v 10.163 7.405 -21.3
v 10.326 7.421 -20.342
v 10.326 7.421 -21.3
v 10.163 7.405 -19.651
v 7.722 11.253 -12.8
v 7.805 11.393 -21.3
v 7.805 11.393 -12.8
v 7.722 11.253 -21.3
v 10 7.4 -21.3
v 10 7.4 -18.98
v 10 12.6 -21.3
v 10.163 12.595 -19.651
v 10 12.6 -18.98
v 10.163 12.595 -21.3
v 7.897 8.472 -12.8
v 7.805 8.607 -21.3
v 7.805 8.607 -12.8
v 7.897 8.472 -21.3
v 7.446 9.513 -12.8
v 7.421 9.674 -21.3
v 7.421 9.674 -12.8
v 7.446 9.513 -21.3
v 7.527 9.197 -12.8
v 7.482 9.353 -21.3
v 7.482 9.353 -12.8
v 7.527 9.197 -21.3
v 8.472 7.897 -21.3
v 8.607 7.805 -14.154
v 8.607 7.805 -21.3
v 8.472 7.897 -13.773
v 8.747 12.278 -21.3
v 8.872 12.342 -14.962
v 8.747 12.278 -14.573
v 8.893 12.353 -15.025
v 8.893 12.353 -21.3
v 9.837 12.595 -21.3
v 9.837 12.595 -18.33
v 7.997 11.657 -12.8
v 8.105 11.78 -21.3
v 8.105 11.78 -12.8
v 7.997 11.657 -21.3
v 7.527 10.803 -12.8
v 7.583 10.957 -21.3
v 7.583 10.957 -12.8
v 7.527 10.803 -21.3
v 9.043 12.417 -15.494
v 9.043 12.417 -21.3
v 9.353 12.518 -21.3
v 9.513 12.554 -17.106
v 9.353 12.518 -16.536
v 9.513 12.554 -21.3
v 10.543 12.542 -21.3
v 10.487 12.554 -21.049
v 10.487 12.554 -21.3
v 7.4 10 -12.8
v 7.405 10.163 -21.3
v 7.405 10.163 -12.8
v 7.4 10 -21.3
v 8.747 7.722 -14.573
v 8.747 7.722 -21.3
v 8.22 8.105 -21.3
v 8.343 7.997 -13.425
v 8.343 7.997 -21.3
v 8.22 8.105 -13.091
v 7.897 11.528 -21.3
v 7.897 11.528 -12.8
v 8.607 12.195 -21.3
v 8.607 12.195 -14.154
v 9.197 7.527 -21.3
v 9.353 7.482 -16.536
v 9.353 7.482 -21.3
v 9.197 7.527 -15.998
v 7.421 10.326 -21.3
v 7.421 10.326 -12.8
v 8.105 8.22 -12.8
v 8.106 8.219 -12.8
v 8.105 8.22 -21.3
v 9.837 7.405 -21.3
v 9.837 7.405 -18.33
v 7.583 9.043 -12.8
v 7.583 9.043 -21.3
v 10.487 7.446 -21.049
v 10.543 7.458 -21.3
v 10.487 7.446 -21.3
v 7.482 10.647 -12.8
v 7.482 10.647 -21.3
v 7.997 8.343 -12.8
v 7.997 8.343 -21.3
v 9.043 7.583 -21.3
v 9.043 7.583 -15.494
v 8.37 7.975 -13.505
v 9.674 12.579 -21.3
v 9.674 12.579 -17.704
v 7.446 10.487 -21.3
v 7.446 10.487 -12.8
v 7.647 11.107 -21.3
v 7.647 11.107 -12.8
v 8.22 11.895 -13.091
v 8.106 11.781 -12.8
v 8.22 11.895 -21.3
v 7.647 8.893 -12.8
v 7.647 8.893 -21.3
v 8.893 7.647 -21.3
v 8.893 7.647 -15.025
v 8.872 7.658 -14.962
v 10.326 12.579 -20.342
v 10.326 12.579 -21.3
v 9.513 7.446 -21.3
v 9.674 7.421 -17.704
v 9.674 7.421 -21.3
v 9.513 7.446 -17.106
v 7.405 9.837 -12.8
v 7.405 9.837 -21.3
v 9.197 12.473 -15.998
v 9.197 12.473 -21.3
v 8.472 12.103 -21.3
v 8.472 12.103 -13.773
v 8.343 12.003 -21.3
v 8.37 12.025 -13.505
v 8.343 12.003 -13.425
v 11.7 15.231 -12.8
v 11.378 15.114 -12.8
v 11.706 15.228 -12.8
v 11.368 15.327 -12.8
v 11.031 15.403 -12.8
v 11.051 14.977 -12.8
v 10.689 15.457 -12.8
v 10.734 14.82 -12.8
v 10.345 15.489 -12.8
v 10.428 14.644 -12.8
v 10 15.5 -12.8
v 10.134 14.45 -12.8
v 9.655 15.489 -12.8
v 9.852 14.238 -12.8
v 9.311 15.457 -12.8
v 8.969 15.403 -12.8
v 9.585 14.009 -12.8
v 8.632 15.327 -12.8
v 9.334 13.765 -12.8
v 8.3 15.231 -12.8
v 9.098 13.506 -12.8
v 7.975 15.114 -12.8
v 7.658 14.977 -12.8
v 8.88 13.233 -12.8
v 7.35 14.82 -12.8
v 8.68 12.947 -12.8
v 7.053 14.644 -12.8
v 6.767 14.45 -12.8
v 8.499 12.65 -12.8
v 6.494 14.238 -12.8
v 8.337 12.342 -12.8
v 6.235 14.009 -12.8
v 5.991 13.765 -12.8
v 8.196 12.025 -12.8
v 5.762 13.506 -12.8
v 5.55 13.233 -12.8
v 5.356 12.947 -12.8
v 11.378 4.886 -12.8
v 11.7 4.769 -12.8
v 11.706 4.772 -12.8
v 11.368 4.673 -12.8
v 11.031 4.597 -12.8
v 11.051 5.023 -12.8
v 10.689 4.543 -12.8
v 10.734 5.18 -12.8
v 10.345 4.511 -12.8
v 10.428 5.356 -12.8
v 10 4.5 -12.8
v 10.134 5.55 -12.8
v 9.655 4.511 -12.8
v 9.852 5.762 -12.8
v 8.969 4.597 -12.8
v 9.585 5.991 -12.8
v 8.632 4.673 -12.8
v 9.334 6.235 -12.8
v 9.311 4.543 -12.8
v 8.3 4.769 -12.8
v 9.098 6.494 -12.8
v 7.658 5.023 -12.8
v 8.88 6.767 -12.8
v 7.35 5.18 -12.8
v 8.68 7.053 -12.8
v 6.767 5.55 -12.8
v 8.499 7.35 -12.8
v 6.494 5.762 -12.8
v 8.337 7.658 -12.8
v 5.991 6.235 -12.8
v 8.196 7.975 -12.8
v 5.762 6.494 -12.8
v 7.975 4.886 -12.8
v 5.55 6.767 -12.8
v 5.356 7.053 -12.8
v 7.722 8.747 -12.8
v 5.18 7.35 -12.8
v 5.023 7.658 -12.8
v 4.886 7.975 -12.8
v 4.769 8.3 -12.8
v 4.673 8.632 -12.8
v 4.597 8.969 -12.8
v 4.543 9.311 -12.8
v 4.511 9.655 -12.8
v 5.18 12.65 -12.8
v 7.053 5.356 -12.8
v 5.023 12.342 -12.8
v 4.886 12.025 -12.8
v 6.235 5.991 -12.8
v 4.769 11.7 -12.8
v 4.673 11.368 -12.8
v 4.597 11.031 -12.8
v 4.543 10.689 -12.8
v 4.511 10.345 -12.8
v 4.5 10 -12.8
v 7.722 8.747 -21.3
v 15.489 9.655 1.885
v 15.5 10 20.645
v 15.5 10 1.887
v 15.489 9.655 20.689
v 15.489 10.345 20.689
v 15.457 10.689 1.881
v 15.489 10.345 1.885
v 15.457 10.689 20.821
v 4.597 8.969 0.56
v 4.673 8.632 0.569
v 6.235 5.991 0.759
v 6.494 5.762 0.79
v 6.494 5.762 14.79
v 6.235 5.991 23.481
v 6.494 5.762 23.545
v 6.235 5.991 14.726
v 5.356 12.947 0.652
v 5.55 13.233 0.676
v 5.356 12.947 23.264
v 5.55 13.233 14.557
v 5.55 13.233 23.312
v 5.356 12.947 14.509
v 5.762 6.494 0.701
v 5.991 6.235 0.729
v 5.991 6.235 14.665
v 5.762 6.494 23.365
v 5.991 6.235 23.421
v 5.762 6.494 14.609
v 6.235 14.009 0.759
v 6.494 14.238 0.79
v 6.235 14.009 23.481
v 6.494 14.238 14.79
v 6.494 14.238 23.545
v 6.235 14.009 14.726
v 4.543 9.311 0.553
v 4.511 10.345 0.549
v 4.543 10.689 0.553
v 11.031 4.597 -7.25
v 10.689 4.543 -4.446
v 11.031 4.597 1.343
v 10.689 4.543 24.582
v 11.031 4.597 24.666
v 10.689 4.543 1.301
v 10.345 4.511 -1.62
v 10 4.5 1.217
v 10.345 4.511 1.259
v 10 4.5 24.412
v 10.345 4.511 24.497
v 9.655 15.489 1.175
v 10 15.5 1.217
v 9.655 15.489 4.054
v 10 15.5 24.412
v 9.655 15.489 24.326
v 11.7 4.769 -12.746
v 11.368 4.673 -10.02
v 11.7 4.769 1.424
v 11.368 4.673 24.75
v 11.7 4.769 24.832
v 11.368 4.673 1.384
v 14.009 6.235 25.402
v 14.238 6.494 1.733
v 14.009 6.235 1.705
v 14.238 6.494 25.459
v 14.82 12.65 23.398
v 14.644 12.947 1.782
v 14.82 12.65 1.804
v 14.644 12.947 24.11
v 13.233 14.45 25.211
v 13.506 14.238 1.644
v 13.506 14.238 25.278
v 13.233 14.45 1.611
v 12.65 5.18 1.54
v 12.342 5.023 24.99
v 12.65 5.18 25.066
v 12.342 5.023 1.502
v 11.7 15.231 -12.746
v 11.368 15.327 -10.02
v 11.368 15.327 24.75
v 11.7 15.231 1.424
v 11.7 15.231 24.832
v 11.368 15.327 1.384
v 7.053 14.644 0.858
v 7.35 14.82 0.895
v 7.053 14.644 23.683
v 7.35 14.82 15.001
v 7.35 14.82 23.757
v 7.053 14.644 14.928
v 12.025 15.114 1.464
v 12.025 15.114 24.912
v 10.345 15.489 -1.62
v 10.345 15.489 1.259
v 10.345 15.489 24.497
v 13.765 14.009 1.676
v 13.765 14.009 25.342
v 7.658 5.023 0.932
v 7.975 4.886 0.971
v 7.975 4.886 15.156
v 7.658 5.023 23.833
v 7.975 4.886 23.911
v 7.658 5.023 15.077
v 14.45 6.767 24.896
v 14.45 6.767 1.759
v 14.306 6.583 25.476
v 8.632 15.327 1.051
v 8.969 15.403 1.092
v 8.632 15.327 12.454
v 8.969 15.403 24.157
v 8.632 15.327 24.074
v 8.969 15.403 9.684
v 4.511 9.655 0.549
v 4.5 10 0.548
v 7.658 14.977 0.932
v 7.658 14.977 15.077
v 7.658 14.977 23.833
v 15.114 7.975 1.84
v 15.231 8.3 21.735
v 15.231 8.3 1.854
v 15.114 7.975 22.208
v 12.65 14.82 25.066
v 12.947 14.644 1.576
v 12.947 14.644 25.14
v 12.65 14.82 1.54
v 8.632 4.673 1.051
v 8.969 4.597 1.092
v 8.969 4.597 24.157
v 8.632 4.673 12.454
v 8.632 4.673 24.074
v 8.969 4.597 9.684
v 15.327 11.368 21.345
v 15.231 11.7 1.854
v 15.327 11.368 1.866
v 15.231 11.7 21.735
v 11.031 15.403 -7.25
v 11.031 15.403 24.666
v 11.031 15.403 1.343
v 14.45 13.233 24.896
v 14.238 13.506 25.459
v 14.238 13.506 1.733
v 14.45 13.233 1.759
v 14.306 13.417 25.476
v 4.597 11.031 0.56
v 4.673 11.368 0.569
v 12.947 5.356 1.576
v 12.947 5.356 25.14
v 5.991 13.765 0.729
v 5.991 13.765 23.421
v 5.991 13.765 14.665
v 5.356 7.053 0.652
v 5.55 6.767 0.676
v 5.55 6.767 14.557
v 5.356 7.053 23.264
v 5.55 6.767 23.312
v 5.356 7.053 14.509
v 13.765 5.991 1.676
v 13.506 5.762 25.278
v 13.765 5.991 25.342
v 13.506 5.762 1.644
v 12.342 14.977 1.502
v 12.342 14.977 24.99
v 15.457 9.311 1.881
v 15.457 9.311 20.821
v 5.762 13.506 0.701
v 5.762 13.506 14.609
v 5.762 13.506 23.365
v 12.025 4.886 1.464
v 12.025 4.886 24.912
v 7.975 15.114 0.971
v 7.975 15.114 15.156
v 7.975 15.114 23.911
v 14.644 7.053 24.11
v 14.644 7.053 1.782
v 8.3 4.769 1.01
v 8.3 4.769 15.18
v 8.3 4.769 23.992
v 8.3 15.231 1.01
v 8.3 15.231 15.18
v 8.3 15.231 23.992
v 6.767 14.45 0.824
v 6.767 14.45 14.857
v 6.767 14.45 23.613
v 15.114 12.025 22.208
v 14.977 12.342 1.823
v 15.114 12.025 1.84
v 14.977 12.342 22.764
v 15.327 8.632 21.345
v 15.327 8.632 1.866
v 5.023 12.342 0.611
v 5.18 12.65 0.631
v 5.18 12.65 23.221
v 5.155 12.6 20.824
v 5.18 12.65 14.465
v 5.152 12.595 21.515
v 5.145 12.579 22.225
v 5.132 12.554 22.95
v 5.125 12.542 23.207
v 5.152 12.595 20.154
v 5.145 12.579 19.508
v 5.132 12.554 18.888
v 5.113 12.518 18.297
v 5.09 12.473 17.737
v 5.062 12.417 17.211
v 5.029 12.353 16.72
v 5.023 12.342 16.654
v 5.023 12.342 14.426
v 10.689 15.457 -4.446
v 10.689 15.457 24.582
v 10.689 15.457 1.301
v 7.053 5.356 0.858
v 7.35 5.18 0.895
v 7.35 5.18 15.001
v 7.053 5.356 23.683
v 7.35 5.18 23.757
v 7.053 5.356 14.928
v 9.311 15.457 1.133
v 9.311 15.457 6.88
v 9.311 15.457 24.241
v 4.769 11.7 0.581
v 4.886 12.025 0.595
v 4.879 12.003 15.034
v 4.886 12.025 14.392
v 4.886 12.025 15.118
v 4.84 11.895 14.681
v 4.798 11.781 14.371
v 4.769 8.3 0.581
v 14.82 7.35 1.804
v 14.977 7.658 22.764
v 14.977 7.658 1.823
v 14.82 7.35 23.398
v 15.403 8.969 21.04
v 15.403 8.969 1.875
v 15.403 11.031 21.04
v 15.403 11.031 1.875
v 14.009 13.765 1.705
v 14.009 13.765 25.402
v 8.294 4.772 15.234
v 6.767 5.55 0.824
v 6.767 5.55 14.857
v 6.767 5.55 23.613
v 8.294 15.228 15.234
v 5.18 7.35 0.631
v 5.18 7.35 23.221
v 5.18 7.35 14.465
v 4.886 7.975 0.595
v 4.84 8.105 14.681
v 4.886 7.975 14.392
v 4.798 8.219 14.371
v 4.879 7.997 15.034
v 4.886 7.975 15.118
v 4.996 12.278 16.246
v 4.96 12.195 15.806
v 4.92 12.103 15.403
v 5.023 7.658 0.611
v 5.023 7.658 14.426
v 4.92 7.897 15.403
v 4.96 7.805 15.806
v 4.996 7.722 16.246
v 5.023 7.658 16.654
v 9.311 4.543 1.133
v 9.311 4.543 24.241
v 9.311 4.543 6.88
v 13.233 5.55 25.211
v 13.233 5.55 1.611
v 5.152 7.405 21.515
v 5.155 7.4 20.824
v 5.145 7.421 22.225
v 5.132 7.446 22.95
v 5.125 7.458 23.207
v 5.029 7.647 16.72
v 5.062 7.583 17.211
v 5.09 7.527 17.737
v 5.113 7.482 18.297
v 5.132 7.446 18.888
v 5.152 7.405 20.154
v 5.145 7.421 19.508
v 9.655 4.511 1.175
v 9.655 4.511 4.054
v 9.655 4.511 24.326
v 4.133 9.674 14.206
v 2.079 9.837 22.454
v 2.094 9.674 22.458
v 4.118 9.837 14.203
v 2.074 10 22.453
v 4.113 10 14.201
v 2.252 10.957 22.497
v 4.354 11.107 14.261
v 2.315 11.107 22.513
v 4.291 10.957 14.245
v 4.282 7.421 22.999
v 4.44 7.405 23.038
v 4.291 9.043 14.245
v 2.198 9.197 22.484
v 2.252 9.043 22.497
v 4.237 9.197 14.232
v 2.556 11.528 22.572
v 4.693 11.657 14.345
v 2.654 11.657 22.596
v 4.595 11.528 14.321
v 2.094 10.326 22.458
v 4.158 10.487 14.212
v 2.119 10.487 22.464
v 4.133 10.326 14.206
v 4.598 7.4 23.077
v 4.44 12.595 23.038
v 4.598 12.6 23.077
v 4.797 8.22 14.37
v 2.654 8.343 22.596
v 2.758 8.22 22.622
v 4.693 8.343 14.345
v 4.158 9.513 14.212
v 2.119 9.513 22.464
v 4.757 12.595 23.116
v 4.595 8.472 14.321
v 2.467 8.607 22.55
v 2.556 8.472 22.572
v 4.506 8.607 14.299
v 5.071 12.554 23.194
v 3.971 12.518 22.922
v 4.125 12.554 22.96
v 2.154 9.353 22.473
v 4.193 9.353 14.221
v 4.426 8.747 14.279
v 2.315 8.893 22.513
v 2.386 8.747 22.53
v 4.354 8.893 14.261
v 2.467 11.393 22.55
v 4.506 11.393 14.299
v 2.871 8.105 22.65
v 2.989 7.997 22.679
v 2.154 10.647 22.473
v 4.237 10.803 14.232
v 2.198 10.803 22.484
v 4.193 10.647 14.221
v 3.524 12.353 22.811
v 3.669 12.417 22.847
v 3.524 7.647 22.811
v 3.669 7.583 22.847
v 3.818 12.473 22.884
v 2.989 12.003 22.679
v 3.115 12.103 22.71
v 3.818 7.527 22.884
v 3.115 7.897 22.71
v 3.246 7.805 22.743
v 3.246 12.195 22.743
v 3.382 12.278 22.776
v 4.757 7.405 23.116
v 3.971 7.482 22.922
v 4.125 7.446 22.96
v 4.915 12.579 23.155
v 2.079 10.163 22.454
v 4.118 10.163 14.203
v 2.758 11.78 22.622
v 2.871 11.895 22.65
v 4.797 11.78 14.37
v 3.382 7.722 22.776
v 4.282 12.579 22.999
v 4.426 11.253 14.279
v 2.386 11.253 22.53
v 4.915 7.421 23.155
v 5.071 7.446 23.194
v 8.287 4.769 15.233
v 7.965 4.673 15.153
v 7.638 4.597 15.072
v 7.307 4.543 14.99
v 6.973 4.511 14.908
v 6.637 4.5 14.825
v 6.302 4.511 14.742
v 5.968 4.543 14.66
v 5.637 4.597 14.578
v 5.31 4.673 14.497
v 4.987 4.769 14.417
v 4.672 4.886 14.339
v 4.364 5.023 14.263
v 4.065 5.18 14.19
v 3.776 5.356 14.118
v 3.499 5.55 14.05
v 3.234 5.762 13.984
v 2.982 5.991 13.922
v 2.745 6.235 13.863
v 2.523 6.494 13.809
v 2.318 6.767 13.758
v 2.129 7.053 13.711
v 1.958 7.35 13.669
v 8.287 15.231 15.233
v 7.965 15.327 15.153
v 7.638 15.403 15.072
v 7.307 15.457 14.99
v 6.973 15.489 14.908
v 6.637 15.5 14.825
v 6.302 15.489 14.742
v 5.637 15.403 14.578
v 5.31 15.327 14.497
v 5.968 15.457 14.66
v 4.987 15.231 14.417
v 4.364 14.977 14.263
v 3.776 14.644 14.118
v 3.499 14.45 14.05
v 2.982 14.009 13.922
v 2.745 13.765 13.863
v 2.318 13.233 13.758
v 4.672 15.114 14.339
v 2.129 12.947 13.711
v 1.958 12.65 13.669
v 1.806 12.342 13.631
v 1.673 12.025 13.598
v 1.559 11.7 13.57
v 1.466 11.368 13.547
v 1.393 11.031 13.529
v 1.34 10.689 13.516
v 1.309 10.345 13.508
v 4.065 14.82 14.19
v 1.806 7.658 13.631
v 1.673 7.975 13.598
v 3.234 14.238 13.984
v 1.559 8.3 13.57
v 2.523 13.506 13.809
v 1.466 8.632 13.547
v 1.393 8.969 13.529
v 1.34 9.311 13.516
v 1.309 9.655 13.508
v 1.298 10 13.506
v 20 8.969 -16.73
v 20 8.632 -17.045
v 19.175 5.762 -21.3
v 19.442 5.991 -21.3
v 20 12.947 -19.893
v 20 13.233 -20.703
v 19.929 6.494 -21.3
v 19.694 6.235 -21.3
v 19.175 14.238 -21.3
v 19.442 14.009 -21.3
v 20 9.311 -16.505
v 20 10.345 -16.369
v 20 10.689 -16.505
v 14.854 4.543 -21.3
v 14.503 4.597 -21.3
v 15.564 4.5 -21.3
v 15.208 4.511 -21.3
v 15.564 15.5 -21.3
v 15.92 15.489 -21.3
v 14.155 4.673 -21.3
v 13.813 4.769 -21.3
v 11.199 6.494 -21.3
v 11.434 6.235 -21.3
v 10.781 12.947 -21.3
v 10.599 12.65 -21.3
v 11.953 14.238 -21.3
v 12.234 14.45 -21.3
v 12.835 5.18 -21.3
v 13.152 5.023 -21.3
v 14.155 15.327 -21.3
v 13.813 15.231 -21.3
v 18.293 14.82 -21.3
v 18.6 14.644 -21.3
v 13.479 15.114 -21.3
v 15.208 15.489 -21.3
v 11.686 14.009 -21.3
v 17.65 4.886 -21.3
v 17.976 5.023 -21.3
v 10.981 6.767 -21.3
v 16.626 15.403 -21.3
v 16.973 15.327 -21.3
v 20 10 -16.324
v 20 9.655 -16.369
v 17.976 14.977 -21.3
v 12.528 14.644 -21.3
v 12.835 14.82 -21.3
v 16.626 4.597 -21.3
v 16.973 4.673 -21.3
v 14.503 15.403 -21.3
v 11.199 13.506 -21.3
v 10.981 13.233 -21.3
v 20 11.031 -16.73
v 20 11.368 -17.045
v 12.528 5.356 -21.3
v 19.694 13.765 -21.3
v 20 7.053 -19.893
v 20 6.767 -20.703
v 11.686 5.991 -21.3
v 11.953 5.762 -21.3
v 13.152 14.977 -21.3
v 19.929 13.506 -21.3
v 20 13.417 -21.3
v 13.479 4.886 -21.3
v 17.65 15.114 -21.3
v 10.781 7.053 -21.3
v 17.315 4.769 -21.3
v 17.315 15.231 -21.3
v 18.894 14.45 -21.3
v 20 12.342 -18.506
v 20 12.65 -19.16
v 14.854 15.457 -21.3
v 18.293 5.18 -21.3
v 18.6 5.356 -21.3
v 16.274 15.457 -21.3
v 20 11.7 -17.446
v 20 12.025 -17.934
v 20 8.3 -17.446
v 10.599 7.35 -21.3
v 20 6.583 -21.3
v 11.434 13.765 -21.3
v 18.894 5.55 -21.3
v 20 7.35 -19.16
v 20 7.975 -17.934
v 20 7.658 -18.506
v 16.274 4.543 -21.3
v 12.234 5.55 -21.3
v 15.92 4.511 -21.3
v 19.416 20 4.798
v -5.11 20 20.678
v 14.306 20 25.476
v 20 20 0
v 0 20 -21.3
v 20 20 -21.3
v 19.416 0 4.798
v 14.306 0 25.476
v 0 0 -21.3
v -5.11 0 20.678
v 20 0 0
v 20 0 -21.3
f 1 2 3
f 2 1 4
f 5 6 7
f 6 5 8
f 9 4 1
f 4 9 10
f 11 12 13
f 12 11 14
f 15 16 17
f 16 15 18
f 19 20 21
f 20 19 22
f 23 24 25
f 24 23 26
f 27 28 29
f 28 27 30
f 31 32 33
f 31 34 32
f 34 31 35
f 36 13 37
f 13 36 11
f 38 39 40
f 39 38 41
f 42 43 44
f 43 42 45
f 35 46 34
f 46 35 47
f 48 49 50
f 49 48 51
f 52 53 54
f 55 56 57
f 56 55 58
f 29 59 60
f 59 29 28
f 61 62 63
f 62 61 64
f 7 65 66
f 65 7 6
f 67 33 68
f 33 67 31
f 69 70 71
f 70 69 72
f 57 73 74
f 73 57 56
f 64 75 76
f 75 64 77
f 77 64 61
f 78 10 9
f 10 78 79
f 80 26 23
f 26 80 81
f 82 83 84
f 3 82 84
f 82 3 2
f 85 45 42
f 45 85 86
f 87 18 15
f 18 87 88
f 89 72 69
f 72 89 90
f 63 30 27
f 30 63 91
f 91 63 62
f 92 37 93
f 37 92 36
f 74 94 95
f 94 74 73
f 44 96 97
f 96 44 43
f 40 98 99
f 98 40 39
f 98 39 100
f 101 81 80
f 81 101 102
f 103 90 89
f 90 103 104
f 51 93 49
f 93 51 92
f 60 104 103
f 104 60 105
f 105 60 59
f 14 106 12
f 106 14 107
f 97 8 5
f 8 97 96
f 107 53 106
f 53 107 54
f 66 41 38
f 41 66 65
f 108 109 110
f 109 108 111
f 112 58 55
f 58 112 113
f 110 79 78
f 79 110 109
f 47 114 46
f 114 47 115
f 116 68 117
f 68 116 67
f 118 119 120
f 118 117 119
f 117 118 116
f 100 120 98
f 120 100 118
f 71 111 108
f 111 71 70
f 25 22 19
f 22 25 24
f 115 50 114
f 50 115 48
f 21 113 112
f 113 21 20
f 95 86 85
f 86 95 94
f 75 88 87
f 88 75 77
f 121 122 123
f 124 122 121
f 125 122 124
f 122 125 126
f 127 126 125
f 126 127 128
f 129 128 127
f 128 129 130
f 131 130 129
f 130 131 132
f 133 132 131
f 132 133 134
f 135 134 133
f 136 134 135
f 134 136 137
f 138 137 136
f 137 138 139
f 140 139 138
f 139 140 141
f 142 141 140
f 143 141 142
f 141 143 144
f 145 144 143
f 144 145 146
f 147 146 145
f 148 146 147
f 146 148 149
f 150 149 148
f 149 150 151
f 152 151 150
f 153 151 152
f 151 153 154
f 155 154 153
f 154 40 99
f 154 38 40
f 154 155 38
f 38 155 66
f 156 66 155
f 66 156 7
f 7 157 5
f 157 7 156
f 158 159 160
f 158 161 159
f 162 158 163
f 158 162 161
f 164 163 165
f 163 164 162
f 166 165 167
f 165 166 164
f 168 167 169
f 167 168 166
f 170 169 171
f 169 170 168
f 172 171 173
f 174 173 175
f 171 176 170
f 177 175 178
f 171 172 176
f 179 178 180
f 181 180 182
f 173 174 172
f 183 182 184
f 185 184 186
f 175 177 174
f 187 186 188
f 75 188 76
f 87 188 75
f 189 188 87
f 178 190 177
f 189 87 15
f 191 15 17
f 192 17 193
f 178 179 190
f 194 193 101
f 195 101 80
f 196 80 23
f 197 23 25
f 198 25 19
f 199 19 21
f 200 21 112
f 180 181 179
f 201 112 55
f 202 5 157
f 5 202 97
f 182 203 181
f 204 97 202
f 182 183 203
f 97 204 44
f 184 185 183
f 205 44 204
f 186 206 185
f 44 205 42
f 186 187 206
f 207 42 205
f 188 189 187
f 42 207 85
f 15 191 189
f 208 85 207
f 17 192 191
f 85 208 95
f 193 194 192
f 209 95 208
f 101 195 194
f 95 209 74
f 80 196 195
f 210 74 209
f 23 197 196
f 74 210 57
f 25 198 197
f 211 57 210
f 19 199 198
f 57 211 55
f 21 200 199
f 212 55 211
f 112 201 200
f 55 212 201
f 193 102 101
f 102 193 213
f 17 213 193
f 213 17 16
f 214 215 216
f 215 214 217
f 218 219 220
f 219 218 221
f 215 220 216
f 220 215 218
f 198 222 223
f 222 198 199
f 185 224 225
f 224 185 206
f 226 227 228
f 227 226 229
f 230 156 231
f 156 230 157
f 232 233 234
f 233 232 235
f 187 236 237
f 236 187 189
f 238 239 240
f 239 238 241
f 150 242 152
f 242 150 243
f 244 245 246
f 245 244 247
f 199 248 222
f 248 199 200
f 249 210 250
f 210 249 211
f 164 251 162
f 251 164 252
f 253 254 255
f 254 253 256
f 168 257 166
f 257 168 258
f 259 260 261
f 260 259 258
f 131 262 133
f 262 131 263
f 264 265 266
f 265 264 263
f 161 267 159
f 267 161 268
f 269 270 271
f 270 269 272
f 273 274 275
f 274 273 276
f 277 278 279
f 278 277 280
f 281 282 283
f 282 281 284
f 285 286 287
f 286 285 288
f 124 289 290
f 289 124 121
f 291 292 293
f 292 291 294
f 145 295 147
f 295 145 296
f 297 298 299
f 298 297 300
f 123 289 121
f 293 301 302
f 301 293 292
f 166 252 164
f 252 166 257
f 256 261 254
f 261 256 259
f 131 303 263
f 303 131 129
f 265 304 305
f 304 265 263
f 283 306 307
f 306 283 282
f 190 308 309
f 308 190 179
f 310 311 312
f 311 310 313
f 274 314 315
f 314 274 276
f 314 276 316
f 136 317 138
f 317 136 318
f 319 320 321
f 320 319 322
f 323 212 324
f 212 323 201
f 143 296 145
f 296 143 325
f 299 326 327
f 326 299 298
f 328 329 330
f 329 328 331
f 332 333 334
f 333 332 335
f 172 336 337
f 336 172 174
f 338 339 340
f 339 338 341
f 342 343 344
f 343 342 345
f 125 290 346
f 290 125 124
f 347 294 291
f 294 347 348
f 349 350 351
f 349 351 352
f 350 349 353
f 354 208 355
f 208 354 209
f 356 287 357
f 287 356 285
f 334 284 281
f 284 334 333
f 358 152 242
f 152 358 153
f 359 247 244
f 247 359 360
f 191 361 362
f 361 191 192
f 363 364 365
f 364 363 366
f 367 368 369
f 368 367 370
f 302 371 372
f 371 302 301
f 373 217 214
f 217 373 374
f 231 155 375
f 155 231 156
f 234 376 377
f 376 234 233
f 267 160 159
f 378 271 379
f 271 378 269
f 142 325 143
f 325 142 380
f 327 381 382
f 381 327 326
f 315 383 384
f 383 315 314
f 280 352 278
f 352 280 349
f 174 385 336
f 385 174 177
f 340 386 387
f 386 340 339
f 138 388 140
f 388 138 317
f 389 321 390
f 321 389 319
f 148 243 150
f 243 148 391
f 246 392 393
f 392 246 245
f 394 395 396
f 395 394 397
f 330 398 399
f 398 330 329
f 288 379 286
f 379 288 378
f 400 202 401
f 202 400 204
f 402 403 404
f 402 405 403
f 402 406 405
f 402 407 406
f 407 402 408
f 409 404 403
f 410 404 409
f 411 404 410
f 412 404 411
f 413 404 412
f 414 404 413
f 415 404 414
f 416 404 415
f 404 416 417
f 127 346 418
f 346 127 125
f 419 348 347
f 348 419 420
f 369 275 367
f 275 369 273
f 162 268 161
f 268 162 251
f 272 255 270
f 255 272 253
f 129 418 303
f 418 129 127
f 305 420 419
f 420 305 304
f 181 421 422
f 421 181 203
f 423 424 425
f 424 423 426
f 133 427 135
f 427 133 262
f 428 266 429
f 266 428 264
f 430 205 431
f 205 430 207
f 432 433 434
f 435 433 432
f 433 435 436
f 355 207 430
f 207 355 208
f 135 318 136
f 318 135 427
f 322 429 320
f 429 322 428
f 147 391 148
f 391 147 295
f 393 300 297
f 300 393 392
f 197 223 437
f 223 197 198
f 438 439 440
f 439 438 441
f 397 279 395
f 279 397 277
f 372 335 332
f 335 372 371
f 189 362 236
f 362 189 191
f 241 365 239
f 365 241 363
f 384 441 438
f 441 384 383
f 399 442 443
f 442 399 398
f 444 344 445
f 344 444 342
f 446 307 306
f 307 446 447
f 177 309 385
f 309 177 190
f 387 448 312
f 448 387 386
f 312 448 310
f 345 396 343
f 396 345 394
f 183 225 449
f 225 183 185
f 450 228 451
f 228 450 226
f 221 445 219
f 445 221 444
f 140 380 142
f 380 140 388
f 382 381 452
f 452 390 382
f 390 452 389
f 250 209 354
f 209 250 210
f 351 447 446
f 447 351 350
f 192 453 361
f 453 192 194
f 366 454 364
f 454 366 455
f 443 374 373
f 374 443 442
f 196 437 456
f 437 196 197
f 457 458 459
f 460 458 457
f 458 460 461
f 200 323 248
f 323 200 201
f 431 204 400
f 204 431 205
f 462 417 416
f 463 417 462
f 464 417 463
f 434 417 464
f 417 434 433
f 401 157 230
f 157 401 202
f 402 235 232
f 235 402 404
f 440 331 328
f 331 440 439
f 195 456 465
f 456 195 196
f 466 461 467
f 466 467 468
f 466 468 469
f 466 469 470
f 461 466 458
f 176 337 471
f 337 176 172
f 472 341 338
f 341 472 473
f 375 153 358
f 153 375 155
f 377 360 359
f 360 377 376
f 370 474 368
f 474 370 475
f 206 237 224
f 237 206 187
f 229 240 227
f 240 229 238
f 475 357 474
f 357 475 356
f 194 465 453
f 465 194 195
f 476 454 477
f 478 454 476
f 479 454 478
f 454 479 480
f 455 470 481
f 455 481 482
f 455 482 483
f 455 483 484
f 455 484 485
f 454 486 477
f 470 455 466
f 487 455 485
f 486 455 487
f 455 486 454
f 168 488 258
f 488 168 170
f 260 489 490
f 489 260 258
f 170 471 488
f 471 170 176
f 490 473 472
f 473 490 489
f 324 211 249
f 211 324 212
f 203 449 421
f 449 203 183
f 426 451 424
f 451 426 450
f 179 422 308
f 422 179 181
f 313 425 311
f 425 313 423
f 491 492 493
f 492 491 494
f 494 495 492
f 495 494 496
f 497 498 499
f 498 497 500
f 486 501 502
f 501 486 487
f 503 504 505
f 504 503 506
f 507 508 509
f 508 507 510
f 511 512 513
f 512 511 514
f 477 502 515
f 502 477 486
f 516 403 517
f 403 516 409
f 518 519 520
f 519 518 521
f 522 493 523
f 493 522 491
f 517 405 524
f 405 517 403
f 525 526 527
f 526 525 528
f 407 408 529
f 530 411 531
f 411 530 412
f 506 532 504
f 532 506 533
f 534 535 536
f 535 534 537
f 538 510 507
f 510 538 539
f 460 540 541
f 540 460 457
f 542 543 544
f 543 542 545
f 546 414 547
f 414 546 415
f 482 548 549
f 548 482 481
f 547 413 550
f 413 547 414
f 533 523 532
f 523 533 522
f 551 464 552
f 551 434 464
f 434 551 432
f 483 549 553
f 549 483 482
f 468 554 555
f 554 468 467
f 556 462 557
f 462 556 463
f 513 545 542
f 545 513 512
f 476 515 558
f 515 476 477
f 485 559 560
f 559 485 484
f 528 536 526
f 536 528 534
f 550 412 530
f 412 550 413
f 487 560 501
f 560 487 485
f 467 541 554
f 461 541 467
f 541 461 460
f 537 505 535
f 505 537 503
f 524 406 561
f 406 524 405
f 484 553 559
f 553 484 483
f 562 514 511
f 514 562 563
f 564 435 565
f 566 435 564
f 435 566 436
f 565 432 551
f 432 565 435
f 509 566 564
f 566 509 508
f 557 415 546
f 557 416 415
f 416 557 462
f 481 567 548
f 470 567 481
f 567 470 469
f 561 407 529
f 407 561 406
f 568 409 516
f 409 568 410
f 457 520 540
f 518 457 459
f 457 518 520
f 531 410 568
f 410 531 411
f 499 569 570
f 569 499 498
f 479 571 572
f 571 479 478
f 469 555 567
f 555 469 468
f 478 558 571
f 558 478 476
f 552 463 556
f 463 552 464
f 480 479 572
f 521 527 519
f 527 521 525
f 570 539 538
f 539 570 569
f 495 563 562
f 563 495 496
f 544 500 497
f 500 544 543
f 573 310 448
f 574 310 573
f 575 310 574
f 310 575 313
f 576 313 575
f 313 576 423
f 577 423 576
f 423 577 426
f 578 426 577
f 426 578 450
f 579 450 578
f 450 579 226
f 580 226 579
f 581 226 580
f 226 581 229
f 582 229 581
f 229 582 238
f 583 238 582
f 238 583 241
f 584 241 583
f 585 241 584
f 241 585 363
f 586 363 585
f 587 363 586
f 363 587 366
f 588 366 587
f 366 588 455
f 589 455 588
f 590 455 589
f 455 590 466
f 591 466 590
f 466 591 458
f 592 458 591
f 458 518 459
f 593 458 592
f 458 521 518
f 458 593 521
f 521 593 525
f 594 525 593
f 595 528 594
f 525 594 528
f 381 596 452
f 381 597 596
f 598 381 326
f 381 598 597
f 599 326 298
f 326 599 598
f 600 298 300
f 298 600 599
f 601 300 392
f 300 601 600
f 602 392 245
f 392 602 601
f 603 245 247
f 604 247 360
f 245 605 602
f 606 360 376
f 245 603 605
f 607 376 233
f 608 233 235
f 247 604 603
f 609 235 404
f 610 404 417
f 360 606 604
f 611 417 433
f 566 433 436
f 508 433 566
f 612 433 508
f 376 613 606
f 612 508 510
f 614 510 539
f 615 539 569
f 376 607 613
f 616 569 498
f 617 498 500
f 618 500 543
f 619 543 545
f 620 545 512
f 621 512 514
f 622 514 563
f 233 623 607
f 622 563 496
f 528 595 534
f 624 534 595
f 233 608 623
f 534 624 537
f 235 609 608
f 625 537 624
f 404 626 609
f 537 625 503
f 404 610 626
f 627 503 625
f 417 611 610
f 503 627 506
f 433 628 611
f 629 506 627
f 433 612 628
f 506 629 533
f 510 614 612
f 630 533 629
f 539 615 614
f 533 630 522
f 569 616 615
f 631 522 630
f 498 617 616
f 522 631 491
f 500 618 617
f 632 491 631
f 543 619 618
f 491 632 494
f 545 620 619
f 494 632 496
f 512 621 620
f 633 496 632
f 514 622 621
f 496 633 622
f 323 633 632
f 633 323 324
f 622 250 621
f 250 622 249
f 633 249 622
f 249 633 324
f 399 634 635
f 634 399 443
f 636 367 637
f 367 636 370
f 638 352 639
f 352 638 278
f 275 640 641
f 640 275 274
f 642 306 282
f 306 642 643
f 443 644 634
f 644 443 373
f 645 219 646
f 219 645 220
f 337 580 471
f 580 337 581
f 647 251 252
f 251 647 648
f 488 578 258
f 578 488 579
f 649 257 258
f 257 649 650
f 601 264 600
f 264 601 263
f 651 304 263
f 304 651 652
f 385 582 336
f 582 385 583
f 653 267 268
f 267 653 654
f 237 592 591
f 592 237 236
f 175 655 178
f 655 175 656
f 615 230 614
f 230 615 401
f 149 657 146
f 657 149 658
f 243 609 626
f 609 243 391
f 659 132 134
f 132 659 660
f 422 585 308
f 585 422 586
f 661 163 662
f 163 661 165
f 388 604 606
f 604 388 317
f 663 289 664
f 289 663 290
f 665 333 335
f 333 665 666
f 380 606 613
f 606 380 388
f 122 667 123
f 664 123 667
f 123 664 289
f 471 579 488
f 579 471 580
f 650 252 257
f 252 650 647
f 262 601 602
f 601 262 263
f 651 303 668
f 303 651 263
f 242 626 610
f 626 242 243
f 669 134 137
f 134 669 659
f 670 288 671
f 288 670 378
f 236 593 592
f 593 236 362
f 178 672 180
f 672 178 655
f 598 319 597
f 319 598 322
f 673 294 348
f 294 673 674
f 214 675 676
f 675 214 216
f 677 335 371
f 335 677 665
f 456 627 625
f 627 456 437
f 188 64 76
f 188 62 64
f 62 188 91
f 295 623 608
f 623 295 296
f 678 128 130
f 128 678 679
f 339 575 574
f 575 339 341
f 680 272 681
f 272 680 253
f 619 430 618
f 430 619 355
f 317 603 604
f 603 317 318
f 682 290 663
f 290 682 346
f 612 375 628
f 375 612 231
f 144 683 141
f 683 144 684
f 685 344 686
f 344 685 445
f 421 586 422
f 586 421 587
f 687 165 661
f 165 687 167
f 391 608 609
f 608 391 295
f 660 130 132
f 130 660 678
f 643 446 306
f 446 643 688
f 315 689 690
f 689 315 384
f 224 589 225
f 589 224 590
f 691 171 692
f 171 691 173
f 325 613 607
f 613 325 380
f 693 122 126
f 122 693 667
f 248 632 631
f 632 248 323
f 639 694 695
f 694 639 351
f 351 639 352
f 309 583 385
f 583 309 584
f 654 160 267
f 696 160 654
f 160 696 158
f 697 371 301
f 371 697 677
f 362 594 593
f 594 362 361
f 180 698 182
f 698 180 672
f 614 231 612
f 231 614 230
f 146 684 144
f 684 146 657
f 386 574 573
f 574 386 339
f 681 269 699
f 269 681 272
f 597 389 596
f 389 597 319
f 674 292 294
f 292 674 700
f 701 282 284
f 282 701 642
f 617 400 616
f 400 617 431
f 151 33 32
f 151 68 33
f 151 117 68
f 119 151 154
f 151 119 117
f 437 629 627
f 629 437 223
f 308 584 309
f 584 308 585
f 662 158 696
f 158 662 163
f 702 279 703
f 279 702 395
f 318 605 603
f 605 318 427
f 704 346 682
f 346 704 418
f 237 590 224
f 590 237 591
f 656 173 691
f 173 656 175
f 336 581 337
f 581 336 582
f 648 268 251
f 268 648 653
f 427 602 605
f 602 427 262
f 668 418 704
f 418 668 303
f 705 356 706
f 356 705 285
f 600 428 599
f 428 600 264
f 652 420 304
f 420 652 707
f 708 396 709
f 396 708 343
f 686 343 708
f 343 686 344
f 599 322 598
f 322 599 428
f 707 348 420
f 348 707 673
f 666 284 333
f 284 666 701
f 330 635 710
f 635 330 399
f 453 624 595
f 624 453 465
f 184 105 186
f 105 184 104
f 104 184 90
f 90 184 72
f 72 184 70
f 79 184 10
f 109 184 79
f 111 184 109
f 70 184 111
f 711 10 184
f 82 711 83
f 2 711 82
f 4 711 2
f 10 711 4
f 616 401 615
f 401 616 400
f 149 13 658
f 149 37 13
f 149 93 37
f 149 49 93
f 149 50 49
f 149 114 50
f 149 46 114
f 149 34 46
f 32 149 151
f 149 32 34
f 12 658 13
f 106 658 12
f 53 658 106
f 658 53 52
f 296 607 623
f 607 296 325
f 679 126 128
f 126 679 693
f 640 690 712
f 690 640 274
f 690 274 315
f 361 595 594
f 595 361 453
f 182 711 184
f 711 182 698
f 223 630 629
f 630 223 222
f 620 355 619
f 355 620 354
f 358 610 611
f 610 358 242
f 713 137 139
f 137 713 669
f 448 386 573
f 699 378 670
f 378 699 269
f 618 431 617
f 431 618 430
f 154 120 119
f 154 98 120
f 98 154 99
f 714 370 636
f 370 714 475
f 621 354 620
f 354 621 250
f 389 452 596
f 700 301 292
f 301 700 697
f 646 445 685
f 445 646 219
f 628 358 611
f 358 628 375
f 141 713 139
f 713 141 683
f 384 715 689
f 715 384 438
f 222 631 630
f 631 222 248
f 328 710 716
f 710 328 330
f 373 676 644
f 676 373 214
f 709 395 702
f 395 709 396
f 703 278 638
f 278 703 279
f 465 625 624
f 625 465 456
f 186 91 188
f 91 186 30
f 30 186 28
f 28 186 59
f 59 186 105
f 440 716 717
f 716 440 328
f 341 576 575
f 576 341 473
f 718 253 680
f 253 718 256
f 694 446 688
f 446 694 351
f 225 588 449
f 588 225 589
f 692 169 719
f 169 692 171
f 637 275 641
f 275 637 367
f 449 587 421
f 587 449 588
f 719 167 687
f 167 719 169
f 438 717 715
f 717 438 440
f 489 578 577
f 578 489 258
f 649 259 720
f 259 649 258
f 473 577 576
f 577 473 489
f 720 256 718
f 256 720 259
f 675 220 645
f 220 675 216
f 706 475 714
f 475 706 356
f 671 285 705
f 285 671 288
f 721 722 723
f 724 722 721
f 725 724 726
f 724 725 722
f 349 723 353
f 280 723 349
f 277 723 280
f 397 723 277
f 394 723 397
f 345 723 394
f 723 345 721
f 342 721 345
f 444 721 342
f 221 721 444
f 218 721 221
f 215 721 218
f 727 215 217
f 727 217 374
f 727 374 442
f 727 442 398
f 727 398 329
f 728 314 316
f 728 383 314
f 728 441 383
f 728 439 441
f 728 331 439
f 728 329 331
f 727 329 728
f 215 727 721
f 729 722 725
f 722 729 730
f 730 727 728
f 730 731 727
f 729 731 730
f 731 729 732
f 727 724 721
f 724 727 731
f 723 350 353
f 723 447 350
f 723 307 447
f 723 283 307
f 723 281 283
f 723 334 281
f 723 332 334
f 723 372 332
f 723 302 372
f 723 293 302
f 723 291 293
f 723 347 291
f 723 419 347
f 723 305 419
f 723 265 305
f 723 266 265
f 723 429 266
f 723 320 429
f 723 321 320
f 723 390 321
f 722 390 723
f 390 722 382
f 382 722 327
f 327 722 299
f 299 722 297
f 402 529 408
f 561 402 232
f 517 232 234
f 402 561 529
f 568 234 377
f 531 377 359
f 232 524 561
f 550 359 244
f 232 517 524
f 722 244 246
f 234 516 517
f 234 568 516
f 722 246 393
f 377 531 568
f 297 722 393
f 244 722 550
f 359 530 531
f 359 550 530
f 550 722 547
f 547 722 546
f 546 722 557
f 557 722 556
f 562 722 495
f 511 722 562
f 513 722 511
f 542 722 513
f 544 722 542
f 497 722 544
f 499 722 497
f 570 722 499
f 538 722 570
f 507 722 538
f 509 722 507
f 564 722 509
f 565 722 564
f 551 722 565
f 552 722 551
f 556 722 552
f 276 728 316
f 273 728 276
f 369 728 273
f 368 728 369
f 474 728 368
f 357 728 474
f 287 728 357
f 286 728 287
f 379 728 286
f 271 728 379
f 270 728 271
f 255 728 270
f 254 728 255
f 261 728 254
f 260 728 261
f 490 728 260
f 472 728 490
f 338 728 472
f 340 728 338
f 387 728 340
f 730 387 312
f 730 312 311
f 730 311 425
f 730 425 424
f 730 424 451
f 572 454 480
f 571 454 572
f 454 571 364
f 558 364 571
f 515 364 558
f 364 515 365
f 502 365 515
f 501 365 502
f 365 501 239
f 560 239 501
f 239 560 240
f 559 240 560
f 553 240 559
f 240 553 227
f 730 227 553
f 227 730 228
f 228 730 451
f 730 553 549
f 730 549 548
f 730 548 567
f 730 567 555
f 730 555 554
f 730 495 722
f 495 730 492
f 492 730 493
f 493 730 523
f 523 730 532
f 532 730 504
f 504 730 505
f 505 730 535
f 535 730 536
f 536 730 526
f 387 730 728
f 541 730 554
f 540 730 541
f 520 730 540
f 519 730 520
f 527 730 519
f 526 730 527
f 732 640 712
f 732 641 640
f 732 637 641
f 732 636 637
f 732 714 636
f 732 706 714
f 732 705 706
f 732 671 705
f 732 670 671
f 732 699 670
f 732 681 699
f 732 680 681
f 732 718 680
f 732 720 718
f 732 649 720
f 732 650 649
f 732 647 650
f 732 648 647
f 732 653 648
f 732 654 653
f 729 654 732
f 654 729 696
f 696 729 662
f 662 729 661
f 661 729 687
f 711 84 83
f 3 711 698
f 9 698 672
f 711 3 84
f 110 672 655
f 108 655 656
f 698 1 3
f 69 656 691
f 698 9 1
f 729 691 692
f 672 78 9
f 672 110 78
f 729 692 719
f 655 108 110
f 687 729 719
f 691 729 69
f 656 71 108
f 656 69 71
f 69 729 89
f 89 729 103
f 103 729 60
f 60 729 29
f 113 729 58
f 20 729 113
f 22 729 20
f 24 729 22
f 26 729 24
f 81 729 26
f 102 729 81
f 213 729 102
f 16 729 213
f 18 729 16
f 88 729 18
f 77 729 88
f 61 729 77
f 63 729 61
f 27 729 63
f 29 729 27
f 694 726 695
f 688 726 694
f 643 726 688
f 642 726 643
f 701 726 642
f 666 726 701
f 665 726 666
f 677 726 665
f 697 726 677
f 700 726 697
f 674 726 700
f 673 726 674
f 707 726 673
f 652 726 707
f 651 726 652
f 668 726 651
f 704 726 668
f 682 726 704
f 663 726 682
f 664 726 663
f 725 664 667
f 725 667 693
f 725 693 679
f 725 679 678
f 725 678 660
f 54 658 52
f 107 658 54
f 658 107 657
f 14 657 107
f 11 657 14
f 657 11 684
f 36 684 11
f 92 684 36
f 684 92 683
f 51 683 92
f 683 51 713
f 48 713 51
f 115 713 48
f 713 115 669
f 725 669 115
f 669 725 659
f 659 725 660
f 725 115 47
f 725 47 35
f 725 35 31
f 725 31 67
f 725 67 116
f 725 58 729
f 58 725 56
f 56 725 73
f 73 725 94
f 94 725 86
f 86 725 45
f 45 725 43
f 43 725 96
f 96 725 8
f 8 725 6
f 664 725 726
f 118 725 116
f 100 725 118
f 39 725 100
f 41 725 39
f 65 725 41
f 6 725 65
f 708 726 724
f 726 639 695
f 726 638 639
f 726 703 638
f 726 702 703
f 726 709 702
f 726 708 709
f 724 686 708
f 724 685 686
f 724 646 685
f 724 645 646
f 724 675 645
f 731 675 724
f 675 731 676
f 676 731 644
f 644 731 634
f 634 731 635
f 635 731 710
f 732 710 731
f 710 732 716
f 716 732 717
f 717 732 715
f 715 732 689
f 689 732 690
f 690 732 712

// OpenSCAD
include <../Household/references.scad>

width_object = 20;
length_object = 20;
height_object = 21.3;

width_material_to_block_screw = 3; //3 mm should be enough to maintain the screw

module block(){
    //difference(){
        cube([width_object,length_object,height_object]);
        
    //}
    }
    
    
difference(){    
hull(){
translate([0,0,-height_object]){    
block();
  
    }
    
rotate([0,166.12,0]){
    translate([-width_object,0,-height_object]){
        block();
        }
        }    
    }
translate([0,0,-height_object]){    
translate([width_object/2,length_object/2,0]){
    screw("m5",height_head_input=height_object+100,type_of_dimension="PT");}    
    }



rotate([0,166.12,0]){
    translate([-width_object,0,-height_object]){
        translate([width_object/2,length_object/2,0]){
    screw("m5",height_head_input=height_object+100,type_of_dimension="PT");}    
        }
        }    
    }
